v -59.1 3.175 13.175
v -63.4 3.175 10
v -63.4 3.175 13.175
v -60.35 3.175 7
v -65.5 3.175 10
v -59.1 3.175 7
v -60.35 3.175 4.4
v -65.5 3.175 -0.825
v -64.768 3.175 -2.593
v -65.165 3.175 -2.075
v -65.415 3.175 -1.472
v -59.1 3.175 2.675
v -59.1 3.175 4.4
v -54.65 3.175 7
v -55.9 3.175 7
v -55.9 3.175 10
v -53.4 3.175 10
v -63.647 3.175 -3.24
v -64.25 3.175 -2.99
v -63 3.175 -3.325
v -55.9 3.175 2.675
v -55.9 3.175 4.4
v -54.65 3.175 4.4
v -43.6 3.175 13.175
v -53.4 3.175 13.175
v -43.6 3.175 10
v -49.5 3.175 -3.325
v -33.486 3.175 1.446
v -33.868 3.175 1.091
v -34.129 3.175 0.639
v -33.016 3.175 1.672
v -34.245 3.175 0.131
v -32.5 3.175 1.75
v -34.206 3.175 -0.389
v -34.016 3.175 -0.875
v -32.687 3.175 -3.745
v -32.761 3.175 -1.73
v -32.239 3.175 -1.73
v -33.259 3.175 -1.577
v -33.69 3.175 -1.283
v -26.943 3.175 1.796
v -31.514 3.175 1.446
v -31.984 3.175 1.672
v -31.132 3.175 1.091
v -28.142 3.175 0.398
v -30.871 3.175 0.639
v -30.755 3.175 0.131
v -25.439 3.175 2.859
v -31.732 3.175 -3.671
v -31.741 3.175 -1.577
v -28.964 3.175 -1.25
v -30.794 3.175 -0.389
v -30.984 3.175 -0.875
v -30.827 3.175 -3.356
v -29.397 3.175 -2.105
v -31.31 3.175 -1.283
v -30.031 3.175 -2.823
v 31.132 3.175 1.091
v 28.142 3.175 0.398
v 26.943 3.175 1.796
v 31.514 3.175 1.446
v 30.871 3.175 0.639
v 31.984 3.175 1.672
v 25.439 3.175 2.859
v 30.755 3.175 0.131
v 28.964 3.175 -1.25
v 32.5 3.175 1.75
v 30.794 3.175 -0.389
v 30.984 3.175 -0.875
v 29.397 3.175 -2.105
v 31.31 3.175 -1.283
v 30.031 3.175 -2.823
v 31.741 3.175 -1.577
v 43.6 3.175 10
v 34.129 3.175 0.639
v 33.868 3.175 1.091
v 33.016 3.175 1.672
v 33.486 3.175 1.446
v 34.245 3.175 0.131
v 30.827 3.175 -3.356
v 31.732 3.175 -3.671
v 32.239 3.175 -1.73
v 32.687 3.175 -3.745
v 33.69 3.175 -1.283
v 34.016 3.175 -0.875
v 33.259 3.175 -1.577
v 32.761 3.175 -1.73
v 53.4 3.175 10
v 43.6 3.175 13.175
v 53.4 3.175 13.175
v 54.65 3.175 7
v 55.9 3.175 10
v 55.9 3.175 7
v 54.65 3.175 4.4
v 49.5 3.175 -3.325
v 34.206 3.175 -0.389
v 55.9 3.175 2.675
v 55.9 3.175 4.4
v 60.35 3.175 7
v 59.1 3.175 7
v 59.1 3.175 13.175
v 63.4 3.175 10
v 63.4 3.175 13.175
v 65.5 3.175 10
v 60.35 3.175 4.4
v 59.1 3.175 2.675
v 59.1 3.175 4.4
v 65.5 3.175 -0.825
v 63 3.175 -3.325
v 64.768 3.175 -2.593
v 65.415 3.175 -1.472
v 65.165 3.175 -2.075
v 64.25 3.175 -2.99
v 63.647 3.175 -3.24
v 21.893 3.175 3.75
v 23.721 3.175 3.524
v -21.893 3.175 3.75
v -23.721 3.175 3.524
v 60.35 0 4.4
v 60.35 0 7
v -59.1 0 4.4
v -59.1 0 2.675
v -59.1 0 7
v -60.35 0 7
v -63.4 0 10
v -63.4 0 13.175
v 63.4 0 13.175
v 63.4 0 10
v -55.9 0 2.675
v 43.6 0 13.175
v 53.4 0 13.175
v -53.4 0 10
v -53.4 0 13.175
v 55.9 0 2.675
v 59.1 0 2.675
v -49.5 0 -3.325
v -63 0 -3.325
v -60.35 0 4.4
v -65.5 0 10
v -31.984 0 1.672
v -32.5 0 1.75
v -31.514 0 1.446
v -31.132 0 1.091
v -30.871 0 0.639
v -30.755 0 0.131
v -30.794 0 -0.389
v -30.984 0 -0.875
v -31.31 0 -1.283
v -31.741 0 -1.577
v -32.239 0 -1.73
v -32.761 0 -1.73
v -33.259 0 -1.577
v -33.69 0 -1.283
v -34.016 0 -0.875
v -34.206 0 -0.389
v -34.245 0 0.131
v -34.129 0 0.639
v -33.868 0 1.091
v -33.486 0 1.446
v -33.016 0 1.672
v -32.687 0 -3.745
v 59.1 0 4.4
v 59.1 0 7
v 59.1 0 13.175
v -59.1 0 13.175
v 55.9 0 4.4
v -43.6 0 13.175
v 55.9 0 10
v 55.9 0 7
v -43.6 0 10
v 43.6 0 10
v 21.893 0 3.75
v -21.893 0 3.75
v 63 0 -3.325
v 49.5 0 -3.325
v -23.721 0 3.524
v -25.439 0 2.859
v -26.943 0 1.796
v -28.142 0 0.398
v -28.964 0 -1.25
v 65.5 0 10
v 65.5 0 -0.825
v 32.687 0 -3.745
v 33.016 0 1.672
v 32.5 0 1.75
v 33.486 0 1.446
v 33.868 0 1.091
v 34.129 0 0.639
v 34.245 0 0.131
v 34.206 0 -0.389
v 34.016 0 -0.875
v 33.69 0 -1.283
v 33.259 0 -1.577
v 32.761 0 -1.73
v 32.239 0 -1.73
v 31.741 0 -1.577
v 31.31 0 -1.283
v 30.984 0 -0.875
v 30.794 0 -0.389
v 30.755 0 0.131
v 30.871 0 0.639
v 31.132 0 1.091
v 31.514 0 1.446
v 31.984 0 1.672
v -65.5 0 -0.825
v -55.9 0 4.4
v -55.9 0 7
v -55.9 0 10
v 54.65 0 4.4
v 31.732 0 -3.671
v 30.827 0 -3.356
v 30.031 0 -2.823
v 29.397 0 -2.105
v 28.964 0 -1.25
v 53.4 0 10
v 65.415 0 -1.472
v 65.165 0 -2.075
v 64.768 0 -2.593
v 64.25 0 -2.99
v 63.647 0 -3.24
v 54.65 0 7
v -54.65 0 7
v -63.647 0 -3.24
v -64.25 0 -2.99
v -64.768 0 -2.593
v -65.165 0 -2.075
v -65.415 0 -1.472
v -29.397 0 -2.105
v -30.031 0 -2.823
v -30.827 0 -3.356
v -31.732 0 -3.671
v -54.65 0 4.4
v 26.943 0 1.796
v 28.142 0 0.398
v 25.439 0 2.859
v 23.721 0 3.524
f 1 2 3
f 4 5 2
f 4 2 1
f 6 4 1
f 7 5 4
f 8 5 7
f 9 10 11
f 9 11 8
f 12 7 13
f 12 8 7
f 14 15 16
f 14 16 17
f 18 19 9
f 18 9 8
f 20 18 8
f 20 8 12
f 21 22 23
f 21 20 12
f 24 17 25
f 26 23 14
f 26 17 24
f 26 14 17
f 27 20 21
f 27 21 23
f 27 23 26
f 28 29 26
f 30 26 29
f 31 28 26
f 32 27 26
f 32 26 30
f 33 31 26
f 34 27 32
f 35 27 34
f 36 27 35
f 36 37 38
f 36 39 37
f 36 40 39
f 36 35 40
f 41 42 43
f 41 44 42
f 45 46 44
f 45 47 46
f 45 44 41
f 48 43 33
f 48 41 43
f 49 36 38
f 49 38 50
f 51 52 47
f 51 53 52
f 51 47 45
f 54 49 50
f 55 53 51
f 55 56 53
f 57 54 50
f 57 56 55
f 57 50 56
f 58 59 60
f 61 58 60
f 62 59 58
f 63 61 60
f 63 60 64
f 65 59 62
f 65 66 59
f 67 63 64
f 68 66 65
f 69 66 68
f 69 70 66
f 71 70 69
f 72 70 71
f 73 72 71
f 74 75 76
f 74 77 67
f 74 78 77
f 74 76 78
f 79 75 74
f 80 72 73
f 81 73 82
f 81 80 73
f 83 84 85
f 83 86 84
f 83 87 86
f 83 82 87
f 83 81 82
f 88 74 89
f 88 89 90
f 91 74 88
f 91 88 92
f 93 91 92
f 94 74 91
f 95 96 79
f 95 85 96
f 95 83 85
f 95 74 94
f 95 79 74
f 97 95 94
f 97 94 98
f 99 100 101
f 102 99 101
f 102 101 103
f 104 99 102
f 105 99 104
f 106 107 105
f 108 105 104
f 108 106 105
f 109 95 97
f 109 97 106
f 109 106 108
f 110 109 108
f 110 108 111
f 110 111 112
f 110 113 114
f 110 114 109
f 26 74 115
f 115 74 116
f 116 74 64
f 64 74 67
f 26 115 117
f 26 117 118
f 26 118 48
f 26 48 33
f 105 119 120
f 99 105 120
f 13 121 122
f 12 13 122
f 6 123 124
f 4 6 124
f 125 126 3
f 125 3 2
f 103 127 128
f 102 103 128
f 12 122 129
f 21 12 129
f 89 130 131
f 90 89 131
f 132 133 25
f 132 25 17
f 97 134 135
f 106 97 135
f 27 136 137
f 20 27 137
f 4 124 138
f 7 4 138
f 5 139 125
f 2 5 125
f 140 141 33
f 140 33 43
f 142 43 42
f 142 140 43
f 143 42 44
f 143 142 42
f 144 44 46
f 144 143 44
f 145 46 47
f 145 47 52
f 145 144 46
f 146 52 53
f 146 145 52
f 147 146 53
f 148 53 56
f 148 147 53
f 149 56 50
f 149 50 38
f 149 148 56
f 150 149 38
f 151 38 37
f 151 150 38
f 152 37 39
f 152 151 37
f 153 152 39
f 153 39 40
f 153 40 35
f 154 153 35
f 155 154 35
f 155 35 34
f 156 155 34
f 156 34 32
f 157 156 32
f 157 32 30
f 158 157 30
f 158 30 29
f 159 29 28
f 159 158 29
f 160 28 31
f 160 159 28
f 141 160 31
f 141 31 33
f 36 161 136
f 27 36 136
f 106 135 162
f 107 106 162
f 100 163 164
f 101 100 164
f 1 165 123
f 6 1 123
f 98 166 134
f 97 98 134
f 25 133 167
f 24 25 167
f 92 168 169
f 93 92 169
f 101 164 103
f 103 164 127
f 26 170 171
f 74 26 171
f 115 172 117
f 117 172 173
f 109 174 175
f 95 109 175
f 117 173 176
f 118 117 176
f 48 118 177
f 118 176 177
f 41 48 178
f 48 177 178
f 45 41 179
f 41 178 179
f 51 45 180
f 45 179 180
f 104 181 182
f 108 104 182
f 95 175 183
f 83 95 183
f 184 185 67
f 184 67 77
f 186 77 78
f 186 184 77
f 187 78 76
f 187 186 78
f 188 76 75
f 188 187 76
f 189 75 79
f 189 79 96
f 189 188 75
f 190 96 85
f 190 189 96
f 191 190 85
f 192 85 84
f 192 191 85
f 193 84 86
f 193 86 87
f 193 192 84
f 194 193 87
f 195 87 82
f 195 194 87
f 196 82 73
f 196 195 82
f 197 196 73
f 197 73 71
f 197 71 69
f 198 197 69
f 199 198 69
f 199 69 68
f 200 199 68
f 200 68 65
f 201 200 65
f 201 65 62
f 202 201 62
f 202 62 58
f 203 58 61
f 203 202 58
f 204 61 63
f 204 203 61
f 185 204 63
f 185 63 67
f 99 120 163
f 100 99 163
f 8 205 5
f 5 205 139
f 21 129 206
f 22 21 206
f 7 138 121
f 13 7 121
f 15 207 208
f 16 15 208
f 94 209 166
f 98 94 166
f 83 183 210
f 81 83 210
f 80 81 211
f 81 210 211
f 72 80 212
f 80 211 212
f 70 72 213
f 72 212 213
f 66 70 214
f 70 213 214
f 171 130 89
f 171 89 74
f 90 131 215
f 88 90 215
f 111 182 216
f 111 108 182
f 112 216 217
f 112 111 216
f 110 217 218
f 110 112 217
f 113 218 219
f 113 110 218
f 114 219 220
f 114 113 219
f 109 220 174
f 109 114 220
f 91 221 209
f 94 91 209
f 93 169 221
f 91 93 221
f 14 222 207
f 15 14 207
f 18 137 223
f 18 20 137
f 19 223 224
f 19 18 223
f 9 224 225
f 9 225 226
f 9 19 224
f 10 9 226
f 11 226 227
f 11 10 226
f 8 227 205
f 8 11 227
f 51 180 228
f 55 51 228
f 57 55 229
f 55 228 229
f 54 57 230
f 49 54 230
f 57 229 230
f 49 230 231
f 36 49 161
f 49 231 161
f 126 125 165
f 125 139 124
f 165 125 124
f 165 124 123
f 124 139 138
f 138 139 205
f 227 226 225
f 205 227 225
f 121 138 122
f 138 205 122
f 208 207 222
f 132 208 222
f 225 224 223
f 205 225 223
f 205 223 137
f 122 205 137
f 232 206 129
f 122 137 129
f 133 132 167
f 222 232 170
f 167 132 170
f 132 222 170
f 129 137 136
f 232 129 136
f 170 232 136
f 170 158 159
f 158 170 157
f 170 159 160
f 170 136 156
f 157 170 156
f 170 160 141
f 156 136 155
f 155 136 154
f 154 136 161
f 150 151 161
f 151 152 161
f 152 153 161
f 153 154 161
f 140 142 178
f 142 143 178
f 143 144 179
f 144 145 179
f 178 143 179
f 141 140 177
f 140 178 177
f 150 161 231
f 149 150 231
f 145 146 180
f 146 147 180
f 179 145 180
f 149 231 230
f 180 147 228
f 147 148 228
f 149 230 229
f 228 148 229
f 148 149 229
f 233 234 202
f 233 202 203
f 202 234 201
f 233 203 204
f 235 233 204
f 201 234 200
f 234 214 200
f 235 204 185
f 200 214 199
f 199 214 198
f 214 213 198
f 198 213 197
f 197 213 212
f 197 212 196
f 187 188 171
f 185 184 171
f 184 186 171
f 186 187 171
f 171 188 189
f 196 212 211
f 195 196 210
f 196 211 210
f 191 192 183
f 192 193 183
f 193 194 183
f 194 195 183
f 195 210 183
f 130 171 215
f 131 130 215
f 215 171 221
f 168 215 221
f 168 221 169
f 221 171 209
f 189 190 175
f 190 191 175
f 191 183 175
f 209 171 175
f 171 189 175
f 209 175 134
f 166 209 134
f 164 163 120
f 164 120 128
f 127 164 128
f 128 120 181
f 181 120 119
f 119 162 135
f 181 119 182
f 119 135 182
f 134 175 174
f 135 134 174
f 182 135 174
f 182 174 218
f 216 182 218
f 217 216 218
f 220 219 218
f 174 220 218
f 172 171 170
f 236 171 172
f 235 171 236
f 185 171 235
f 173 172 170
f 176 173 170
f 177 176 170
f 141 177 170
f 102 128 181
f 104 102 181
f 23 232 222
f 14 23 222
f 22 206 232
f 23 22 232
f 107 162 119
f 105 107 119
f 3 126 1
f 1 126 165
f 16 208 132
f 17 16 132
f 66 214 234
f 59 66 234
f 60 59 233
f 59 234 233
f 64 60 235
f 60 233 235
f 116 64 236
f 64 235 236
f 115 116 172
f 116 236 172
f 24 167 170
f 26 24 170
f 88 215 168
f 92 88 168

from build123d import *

# Parameters (mm, degrees)
SKETCH1_R           = 1.75
BOSS_EXTRUDE1_DEPTH = 3.175
FILLET1_R           = 7.5
FILLET2_R           = 2.5


with BuildPart() as part:
    # Sketch1 → Boss-Extrude1 (new body)
    with BuildSketch(Plane(origin=(0, 0, 0), x_dir=(1, 0, 0), z_dir=(0, 1, 0))):
        with BuildLine():
            Line((65.5, 3.325), (49.5, 3.325))
            Line((49.5, 3.325), (32.5, 3.75))
            ThreePointArc((32.5, 3.75), (29.848349571, 2.651650429), (28.75, 0))
            Line((28.75, 0), (28.75, -3.75))
            Line((28.75, -3.75), (-28.75, -3.75))
            Line((-28.75, -3.75), (-28.75, 0))
            ThreePointArc((-28.75, 0), (-29.848349571, 2.651650429), (-32.5, 3.75))
            Line((-32.5, 3.75), (-49.5, 3.325))
            Line((-49.5, 3.325), (-65.5, 3.325))
            Line((-65.5, 3.325), (-65.5, -10))
            Line((-65.5, -10), (-63.4, -10))
            Line((-63.4, -10), (-63.4, -13.175))
            Line((-63.4, -13.175), (-59.1, -13.175))
            Line((-59.1, -13.175), (-59.1, -7))
            Line((-59.1, -7), (-60.35, -7))
            Line((-60.35, -7), (-60.35, -4.4))
            Line((-60.35, -4.4), (-59.1, -4.4))
            Line((-59.1, -4.4), (-59.1, -2.675))
            Line((-59.1, -2.675), (-55.9, -2.675))
            Line((-55.9, -2.675), (-55.9, -4.4))
            Line((-55.9, -4.4), (-54.65, -4.4))
            Line((-54.65, -4.4), (-54.65, -7))
            Line((-54.65, -7), (-55.9, -7))
            Line((-55.9, -7), (-55.9, -10))
            Line((-55.9, -10), (-53.4, -10))
            Line((-53.4, -10), (-53.4, -13.175))
            Line((-53.4, -13.175), (-43.6, -13.175))
            Line((-43.6, -13.175), (-43.6, -10))
            Line((-43.6, -10), (43.6, -10))
            Line((43.6, -10), (43.6, -13.175))
            Line((43.6, -13.175), (53.4, -13.175))
            Line((53.4, -13.175), (53.4, -10))
            Line((53.4, -10), (55.9, -10))
            Line((55.9, -10), (55.9, -7))
            Line((55.9, -7), (54.65, -7))
            Line((54.65, -7), (54.65, -4.4))
            Line((54.65, -4.4), (55.9, -4.4))
            Line((55.9, -4.4), (55.9, -2.675))
            Line((55.9, -2.675), (59.1, -2.675))
            Line((59.1, -2.675), (59.1, -4.4))
            Line((59.1, -4.4), (60.35, -4.4))
            Line((60.35, -4.4), (60.35, -7))
            Line((60.35, -7), (59.1, -7))
            Line((59.1, -7), (59.1, -13.175))
            Line((59.1, -13.175), (63.4, -13.175))
            Line((63.4, -13.175), (63.4, -10))
            Line((63.4, -10), (65.5, -10))
            Line((65.5, -10), (65.5, 3.325))
        make_face()
        with Locations((32.5, 0)):
            Circle(SKETCH1_R, mode=Mode.SUBTRACT)
        with Locations((-32.5, 0)):
            Circle(SKETCH1_R, mode=Mode.SUBTRACT)
    extrude(amount=BOSS_EXTRUDE1_DEPTH)

    # Fillet1
    fillet1_edges = [part.edges().sort_by_distance(p)[0] for p in [
        (-28.75, 1.5875, 3.75),
        (28.75, 1.5875, 3.75),
    ]]
    fillet(fillet1_edges, radius=FILLET1_R)

    # Fillet2
    fillet2_edges = [part.edges().sort_by_distance(p)[0] for p in [
        (-65.5, 1.5875, -3.325),
        (65.5, 1.5875, -3.325),
    ]]
    fillet(fillet2_edges, radius=FILLET2_R)


solid = part.part
